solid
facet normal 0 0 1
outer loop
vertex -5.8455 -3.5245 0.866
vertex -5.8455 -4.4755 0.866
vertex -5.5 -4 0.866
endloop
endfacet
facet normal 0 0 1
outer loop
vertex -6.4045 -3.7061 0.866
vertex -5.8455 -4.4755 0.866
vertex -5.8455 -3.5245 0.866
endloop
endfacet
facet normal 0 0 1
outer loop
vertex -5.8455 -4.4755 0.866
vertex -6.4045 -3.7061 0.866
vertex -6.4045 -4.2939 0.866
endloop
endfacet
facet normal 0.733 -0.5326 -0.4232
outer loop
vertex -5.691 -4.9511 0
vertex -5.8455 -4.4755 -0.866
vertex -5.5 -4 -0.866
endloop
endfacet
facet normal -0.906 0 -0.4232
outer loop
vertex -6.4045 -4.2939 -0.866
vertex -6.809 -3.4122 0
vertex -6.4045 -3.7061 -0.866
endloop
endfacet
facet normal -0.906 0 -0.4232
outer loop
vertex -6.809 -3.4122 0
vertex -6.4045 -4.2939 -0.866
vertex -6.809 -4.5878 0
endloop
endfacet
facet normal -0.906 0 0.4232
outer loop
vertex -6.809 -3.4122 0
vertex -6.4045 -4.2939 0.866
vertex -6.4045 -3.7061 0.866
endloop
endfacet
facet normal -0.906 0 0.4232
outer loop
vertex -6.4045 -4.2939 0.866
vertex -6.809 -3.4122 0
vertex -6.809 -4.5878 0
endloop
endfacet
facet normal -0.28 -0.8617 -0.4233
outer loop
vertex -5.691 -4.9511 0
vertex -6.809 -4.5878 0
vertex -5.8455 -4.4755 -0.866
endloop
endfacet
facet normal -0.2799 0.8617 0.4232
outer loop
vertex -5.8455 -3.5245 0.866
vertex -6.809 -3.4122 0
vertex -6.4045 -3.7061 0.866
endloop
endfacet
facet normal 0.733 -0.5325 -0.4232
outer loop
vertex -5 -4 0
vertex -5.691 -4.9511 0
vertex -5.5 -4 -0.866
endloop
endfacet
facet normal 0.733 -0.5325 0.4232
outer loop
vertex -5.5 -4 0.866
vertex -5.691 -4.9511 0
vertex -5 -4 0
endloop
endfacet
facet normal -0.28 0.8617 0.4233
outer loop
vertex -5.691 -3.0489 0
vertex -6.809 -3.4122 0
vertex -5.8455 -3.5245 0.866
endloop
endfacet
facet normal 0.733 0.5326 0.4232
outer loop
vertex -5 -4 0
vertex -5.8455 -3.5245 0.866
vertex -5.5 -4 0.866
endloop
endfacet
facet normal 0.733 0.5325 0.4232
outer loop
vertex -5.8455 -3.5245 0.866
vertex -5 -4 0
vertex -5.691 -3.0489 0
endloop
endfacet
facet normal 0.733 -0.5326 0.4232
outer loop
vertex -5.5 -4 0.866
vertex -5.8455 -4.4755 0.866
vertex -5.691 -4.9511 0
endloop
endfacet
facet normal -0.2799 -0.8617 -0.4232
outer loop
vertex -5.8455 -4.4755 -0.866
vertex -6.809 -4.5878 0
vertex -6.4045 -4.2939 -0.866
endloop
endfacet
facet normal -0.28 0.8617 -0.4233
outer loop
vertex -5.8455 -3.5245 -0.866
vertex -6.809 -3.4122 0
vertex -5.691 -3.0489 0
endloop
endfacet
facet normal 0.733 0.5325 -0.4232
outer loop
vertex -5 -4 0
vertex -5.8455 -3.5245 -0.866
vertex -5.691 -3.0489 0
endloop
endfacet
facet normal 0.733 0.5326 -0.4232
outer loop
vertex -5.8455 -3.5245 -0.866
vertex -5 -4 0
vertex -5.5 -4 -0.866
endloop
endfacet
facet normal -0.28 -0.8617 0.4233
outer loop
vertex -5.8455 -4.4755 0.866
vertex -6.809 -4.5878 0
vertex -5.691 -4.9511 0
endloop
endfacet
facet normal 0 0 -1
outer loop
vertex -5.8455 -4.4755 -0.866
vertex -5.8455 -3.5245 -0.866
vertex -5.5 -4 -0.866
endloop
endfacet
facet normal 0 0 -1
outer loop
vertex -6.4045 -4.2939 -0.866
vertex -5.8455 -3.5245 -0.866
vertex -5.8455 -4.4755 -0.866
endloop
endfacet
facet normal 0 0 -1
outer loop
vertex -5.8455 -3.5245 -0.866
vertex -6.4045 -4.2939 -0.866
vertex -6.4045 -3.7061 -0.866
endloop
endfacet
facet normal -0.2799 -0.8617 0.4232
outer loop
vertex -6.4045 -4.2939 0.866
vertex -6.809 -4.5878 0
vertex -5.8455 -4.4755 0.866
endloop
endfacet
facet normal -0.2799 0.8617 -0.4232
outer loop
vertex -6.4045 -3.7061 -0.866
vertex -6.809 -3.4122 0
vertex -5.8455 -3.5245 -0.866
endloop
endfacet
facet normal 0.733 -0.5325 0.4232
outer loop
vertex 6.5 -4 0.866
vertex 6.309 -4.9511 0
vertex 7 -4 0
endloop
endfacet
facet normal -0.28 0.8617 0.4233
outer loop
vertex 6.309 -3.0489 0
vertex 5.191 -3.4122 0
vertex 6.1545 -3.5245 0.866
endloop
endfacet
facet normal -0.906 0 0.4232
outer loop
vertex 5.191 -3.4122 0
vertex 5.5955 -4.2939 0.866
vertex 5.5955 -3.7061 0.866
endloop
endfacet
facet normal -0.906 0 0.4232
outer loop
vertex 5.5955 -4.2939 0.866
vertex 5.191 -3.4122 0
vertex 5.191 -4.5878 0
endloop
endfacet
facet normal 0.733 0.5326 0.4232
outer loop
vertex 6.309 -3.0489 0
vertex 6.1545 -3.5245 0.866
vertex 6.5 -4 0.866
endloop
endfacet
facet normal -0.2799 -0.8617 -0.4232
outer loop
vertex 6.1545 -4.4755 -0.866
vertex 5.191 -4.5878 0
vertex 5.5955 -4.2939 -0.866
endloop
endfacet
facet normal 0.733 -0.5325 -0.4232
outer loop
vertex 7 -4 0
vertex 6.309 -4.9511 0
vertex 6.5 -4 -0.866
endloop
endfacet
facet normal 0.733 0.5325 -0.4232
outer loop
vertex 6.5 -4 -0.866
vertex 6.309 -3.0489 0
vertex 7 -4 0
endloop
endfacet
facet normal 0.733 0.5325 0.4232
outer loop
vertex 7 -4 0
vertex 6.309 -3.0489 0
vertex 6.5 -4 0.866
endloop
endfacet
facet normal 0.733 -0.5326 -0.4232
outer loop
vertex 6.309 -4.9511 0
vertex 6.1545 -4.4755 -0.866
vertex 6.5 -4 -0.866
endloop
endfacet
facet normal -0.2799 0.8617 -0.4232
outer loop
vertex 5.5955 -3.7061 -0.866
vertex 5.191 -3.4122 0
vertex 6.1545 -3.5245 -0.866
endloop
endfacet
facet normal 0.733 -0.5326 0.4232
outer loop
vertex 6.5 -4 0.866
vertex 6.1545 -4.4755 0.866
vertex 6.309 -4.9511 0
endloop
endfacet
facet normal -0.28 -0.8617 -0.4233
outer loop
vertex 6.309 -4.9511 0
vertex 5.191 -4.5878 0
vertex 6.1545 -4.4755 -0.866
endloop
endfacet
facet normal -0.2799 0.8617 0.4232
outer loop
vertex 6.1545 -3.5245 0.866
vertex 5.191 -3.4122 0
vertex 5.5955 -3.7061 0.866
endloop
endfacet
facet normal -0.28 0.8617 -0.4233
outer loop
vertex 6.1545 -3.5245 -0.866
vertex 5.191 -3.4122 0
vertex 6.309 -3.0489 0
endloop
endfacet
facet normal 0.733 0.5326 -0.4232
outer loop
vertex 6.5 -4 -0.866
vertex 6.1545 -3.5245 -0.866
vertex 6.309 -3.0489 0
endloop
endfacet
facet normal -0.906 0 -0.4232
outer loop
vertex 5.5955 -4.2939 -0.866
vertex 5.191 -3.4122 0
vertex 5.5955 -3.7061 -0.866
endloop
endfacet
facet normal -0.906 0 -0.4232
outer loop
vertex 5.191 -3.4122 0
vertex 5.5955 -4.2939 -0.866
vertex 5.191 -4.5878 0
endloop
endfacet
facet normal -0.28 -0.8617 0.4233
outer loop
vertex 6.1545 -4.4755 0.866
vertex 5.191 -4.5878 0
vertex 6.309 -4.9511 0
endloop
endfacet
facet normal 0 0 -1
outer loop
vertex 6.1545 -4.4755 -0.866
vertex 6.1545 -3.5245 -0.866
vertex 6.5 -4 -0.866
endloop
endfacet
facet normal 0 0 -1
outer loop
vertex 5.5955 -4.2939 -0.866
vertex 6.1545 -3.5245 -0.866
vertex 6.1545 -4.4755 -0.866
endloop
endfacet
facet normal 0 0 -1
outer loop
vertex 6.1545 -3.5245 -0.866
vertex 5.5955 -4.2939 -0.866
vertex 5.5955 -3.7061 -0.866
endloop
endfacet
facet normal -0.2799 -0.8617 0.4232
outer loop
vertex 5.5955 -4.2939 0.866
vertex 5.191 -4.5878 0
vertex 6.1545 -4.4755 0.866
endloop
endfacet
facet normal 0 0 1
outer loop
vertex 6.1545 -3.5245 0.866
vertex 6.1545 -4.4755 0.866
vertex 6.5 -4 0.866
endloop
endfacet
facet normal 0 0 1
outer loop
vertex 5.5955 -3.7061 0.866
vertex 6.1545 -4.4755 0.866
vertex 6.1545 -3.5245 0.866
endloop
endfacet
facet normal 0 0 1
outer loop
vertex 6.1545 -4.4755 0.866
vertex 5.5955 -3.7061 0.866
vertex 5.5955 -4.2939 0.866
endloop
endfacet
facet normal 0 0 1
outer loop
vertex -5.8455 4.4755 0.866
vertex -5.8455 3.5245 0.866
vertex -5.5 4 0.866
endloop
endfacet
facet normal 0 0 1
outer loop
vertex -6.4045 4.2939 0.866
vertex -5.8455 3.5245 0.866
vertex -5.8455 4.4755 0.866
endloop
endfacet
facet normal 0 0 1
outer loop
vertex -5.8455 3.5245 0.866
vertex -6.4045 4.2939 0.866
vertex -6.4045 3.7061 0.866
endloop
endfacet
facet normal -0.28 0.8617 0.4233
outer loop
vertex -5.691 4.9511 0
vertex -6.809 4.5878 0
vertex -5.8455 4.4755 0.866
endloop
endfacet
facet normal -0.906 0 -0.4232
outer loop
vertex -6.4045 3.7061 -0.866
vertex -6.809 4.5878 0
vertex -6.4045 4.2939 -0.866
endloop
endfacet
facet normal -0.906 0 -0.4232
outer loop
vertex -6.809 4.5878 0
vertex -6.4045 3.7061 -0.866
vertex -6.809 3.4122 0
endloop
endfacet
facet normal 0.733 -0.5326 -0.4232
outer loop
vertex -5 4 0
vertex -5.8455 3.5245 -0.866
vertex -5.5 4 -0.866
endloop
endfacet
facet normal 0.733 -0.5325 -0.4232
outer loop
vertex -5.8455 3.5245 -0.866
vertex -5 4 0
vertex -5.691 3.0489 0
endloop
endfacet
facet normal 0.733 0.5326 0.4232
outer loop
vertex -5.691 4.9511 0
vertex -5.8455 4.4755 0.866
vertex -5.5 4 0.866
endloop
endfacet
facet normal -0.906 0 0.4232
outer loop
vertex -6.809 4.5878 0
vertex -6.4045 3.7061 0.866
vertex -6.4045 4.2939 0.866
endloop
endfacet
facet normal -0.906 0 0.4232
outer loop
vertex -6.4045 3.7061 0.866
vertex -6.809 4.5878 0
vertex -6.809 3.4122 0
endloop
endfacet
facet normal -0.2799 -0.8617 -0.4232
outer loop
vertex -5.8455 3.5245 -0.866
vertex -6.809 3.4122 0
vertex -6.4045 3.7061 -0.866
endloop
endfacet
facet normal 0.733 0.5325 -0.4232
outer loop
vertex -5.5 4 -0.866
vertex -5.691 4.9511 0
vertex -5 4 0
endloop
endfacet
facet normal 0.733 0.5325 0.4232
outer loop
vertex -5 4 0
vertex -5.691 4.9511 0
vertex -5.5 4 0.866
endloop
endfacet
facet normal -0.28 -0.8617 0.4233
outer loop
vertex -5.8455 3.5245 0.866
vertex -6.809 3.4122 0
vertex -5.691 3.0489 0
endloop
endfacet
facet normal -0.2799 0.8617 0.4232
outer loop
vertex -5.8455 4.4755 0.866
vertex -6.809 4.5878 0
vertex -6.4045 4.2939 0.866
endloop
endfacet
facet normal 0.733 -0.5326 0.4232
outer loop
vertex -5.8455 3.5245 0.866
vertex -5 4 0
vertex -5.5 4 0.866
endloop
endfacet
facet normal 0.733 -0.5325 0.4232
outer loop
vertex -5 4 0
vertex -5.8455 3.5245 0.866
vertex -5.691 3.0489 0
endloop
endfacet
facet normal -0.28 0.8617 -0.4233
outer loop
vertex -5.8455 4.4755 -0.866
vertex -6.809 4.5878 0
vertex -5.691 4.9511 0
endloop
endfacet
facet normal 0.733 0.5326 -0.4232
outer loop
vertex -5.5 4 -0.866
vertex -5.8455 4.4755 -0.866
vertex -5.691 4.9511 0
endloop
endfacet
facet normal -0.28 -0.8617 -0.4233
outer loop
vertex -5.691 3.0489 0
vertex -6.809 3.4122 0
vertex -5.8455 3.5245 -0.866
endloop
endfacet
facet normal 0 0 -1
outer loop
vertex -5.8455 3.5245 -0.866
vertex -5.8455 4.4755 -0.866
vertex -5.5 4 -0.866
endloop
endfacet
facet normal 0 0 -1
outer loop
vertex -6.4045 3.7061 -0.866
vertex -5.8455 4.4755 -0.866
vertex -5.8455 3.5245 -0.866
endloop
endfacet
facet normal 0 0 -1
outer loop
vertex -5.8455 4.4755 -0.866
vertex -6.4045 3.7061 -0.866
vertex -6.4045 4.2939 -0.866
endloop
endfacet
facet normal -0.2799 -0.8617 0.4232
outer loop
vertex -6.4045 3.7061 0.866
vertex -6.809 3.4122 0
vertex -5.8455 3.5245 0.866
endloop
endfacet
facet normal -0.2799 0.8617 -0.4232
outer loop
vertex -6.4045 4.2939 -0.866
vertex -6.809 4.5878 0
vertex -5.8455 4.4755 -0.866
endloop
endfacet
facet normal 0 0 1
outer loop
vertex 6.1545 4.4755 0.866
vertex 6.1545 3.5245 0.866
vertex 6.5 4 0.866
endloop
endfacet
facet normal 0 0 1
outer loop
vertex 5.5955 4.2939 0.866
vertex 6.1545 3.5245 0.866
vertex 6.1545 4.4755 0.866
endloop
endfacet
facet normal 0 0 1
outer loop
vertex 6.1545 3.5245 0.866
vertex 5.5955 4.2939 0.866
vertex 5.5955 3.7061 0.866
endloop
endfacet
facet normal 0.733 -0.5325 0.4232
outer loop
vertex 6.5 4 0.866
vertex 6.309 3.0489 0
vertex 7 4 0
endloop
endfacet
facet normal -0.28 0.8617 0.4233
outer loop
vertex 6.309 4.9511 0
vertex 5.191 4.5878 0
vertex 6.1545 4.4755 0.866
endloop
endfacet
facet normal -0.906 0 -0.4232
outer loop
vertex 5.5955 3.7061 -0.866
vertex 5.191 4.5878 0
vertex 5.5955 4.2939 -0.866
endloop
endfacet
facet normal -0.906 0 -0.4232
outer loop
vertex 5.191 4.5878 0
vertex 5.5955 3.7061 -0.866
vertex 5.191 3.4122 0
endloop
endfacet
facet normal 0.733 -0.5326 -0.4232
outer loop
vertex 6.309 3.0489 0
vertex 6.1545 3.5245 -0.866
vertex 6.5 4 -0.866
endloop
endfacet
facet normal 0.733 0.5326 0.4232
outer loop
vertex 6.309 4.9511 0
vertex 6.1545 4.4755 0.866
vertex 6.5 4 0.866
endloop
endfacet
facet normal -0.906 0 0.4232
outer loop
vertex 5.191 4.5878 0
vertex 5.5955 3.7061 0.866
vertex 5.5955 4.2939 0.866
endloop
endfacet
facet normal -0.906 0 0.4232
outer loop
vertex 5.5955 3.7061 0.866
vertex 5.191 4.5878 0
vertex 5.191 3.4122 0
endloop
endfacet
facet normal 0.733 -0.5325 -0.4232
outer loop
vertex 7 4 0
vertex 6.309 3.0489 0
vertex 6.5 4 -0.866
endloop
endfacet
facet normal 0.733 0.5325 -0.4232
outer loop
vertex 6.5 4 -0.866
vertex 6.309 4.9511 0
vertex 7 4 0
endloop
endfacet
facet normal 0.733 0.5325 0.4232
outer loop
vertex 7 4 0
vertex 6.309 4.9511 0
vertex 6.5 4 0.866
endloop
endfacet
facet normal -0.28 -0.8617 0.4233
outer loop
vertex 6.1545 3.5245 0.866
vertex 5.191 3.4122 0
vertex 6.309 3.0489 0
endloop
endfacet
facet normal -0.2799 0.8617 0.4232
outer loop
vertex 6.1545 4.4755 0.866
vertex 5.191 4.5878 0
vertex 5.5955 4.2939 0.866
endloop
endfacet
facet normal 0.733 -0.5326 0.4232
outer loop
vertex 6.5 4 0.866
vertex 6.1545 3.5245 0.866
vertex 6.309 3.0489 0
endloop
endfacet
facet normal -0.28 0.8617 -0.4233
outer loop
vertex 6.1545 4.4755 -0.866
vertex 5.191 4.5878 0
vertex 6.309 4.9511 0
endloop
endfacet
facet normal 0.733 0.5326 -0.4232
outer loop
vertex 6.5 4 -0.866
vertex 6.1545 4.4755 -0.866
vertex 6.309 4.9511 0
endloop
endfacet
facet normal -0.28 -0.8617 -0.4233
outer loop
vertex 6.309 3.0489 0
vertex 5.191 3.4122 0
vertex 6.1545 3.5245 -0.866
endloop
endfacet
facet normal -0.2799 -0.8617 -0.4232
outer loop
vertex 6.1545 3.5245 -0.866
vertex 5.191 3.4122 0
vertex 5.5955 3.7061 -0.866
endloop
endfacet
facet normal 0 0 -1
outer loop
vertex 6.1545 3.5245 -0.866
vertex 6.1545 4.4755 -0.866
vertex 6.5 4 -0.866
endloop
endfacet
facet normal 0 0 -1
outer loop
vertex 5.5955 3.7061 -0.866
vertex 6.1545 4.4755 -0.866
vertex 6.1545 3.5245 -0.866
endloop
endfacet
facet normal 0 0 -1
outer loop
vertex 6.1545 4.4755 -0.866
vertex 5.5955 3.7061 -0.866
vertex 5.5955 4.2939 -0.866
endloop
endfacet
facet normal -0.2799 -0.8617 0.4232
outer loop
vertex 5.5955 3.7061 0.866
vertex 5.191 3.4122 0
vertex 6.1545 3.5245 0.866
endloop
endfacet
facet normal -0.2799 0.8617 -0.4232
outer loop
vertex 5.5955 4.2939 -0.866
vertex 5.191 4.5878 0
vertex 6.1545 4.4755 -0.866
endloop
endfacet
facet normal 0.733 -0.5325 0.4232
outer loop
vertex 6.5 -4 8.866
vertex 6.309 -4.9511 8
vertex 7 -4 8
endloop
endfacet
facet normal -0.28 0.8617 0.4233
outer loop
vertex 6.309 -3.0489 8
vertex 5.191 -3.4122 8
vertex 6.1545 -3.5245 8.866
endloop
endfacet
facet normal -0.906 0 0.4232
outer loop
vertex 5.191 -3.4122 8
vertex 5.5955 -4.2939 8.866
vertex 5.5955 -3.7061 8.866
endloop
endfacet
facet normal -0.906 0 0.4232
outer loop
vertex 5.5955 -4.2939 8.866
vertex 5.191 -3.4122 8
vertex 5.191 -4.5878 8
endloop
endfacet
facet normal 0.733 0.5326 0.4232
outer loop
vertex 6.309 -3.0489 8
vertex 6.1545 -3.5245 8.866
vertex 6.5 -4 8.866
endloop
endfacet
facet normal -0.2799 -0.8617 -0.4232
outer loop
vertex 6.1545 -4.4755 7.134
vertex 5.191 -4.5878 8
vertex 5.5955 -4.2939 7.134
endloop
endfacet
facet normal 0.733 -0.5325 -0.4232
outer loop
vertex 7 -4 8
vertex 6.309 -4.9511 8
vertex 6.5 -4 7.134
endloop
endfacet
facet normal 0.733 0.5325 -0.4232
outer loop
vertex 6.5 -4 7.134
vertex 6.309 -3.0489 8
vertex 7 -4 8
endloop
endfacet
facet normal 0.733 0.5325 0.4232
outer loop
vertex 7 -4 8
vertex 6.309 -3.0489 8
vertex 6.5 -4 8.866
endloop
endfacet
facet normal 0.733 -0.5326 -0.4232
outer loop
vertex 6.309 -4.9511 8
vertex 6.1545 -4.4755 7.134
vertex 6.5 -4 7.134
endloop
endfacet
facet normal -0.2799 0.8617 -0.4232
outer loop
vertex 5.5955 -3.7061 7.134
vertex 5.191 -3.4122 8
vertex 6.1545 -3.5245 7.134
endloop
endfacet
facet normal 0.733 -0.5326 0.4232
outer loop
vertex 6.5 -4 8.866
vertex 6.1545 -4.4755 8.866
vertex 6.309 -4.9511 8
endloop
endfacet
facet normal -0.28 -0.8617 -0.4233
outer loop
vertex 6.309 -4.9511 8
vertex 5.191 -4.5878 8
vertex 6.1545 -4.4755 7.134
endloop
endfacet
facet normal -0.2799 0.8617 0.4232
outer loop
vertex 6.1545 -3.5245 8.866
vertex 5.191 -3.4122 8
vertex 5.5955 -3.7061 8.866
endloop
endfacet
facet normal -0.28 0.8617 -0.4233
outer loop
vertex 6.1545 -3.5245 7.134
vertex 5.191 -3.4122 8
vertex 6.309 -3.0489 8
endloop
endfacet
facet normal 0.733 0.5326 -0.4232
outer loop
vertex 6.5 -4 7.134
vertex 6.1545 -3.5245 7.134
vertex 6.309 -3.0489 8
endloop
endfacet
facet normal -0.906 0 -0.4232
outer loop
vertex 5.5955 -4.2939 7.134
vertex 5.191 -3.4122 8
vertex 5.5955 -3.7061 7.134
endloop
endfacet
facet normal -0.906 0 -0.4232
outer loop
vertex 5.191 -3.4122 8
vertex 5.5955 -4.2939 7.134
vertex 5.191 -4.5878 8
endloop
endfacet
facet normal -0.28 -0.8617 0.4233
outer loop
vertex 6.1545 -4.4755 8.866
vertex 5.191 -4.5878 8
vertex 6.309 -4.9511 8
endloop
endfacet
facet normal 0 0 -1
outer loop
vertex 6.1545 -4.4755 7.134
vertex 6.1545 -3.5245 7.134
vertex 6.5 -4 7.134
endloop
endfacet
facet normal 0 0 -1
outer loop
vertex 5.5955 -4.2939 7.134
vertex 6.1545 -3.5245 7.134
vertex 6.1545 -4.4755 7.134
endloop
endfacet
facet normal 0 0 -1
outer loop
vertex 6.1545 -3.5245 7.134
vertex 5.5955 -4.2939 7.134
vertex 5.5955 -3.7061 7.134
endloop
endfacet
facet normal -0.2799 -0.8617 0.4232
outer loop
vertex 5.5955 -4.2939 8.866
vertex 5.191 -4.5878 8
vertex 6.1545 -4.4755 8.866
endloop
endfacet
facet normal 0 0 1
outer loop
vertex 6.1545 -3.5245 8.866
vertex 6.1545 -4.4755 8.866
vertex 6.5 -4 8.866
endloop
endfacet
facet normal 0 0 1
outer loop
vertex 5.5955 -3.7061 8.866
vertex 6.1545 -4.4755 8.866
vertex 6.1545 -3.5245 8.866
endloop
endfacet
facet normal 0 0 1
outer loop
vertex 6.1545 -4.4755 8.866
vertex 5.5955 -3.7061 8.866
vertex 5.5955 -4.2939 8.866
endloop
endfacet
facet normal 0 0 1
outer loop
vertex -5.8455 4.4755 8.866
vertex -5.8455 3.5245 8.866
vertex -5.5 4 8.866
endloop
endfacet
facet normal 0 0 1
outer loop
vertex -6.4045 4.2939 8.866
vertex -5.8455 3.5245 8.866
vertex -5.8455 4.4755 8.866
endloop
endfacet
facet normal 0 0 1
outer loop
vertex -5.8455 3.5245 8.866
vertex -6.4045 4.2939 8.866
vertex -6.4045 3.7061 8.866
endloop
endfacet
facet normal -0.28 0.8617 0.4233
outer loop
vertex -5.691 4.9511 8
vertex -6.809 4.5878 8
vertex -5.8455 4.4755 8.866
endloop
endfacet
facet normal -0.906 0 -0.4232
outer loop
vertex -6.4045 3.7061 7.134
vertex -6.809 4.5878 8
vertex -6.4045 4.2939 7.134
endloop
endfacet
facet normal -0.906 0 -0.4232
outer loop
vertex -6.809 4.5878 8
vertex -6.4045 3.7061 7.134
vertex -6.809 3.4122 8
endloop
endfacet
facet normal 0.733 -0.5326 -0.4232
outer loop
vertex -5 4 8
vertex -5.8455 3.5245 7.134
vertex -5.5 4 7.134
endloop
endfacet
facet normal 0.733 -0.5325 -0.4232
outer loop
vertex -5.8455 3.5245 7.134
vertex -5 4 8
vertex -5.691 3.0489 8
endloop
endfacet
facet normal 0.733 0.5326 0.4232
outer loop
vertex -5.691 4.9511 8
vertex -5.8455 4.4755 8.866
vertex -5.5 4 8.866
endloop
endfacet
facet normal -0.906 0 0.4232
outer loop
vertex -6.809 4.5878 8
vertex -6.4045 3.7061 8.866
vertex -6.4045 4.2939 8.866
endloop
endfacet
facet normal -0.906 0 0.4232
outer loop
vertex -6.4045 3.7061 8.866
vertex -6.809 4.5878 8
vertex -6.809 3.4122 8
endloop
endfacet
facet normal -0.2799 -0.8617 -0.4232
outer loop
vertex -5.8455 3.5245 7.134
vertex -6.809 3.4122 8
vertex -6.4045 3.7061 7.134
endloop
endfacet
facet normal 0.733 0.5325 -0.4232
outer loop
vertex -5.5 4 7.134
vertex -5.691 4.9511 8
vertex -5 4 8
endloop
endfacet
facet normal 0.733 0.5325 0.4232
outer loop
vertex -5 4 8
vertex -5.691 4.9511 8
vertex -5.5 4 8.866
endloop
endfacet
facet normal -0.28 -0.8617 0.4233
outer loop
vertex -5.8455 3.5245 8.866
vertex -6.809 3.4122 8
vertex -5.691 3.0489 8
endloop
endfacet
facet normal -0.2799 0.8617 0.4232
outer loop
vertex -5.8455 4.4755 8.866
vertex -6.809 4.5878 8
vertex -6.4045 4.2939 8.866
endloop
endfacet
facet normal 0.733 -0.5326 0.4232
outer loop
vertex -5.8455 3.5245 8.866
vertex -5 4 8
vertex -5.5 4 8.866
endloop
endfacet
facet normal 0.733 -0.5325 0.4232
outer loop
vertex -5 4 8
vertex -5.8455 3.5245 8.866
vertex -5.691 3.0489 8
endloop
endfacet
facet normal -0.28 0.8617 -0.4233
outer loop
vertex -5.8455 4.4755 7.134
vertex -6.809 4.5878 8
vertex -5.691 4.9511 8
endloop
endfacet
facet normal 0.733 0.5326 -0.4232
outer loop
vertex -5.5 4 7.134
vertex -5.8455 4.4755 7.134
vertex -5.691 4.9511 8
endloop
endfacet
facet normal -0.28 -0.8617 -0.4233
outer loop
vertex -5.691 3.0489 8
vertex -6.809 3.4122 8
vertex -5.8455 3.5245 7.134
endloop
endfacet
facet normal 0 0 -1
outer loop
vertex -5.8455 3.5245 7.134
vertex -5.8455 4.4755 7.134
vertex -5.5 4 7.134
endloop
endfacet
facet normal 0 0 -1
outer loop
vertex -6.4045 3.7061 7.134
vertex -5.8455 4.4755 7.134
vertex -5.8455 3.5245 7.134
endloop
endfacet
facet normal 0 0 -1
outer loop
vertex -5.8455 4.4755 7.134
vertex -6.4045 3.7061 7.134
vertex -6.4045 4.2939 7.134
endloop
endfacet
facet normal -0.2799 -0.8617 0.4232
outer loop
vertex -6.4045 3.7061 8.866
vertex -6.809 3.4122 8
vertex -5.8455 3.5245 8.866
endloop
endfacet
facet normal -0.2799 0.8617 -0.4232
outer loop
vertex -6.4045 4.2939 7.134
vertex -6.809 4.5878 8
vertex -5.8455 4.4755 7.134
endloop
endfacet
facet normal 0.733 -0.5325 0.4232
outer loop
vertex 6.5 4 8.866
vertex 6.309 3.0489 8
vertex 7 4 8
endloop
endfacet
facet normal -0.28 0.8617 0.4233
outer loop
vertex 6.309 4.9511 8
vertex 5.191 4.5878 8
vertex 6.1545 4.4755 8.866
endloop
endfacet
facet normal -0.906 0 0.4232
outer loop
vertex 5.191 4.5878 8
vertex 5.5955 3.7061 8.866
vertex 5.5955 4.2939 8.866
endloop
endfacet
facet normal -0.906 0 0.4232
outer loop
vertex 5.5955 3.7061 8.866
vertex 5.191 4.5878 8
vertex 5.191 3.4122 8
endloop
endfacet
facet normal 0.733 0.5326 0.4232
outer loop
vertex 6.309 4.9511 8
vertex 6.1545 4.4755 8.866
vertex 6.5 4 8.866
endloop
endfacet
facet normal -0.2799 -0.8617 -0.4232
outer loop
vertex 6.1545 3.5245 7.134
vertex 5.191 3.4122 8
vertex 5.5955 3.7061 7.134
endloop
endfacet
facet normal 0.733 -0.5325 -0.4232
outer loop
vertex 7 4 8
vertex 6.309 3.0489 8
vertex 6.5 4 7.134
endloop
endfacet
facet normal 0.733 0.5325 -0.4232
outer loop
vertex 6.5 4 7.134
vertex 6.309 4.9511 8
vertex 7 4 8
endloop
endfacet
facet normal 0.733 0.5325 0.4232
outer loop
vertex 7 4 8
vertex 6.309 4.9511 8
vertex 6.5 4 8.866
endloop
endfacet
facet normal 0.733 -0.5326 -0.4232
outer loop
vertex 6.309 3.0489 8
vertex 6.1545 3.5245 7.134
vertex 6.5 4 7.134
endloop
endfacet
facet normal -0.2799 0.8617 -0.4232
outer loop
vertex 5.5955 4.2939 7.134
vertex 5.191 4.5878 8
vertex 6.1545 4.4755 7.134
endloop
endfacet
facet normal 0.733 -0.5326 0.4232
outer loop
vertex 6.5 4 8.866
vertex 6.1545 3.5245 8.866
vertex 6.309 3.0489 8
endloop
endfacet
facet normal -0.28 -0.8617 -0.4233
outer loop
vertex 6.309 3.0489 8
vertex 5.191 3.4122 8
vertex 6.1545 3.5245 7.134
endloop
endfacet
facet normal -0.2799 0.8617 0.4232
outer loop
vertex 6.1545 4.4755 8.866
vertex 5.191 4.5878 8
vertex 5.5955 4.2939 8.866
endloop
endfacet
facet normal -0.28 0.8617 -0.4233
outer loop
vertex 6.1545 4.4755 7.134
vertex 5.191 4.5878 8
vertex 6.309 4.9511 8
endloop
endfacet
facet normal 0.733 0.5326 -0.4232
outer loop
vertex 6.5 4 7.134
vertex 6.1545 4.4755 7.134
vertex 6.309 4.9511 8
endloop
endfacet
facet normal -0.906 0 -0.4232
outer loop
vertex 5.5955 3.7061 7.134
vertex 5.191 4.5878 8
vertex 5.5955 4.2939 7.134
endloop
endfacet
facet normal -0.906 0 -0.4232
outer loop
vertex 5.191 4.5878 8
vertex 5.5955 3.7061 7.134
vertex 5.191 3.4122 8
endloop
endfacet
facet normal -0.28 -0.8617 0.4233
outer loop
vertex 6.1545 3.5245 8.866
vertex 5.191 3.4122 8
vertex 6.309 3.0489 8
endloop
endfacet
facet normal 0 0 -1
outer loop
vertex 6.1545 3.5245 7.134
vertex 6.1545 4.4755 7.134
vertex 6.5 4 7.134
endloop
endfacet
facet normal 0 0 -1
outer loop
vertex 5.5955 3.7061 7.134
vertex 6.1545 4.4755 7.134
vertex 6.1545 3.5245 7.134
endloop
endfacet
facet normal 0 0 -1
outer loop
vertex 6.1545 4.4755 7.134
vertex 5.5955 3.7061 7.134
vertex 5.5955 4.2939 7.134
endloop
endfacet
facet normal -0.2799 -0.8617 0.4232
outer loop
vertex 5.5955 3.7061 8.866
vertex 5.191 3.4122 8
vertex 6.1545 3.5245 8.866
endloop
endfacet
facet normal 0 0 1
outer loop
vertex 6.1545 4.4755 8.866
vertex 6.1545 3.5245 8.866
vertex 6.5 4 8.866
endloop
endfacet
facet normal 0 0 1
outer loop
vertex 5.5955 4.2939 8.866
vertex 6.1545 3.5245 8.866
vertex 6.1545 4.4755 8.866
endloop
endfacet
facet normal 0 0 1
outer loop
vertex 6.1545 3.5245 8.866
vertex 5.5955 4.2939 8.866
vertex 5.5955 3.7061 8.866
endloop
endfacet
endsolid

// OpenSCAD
union() {
  translate([-6, -4, 0]) sphere(r=1);
  translate([6, -4, 0]) sphere(r=1);
  translate([-6, 4, 0]) sphere(r=1);
  translate([6, 4, 0]) sphere(r=1);

  translate([6, -4, 8]) sphere(r=1);
  translate([-6, 4, 8]) sphere(r=1);
  translate([6, 4, 8]) sphere(r=1);
}
